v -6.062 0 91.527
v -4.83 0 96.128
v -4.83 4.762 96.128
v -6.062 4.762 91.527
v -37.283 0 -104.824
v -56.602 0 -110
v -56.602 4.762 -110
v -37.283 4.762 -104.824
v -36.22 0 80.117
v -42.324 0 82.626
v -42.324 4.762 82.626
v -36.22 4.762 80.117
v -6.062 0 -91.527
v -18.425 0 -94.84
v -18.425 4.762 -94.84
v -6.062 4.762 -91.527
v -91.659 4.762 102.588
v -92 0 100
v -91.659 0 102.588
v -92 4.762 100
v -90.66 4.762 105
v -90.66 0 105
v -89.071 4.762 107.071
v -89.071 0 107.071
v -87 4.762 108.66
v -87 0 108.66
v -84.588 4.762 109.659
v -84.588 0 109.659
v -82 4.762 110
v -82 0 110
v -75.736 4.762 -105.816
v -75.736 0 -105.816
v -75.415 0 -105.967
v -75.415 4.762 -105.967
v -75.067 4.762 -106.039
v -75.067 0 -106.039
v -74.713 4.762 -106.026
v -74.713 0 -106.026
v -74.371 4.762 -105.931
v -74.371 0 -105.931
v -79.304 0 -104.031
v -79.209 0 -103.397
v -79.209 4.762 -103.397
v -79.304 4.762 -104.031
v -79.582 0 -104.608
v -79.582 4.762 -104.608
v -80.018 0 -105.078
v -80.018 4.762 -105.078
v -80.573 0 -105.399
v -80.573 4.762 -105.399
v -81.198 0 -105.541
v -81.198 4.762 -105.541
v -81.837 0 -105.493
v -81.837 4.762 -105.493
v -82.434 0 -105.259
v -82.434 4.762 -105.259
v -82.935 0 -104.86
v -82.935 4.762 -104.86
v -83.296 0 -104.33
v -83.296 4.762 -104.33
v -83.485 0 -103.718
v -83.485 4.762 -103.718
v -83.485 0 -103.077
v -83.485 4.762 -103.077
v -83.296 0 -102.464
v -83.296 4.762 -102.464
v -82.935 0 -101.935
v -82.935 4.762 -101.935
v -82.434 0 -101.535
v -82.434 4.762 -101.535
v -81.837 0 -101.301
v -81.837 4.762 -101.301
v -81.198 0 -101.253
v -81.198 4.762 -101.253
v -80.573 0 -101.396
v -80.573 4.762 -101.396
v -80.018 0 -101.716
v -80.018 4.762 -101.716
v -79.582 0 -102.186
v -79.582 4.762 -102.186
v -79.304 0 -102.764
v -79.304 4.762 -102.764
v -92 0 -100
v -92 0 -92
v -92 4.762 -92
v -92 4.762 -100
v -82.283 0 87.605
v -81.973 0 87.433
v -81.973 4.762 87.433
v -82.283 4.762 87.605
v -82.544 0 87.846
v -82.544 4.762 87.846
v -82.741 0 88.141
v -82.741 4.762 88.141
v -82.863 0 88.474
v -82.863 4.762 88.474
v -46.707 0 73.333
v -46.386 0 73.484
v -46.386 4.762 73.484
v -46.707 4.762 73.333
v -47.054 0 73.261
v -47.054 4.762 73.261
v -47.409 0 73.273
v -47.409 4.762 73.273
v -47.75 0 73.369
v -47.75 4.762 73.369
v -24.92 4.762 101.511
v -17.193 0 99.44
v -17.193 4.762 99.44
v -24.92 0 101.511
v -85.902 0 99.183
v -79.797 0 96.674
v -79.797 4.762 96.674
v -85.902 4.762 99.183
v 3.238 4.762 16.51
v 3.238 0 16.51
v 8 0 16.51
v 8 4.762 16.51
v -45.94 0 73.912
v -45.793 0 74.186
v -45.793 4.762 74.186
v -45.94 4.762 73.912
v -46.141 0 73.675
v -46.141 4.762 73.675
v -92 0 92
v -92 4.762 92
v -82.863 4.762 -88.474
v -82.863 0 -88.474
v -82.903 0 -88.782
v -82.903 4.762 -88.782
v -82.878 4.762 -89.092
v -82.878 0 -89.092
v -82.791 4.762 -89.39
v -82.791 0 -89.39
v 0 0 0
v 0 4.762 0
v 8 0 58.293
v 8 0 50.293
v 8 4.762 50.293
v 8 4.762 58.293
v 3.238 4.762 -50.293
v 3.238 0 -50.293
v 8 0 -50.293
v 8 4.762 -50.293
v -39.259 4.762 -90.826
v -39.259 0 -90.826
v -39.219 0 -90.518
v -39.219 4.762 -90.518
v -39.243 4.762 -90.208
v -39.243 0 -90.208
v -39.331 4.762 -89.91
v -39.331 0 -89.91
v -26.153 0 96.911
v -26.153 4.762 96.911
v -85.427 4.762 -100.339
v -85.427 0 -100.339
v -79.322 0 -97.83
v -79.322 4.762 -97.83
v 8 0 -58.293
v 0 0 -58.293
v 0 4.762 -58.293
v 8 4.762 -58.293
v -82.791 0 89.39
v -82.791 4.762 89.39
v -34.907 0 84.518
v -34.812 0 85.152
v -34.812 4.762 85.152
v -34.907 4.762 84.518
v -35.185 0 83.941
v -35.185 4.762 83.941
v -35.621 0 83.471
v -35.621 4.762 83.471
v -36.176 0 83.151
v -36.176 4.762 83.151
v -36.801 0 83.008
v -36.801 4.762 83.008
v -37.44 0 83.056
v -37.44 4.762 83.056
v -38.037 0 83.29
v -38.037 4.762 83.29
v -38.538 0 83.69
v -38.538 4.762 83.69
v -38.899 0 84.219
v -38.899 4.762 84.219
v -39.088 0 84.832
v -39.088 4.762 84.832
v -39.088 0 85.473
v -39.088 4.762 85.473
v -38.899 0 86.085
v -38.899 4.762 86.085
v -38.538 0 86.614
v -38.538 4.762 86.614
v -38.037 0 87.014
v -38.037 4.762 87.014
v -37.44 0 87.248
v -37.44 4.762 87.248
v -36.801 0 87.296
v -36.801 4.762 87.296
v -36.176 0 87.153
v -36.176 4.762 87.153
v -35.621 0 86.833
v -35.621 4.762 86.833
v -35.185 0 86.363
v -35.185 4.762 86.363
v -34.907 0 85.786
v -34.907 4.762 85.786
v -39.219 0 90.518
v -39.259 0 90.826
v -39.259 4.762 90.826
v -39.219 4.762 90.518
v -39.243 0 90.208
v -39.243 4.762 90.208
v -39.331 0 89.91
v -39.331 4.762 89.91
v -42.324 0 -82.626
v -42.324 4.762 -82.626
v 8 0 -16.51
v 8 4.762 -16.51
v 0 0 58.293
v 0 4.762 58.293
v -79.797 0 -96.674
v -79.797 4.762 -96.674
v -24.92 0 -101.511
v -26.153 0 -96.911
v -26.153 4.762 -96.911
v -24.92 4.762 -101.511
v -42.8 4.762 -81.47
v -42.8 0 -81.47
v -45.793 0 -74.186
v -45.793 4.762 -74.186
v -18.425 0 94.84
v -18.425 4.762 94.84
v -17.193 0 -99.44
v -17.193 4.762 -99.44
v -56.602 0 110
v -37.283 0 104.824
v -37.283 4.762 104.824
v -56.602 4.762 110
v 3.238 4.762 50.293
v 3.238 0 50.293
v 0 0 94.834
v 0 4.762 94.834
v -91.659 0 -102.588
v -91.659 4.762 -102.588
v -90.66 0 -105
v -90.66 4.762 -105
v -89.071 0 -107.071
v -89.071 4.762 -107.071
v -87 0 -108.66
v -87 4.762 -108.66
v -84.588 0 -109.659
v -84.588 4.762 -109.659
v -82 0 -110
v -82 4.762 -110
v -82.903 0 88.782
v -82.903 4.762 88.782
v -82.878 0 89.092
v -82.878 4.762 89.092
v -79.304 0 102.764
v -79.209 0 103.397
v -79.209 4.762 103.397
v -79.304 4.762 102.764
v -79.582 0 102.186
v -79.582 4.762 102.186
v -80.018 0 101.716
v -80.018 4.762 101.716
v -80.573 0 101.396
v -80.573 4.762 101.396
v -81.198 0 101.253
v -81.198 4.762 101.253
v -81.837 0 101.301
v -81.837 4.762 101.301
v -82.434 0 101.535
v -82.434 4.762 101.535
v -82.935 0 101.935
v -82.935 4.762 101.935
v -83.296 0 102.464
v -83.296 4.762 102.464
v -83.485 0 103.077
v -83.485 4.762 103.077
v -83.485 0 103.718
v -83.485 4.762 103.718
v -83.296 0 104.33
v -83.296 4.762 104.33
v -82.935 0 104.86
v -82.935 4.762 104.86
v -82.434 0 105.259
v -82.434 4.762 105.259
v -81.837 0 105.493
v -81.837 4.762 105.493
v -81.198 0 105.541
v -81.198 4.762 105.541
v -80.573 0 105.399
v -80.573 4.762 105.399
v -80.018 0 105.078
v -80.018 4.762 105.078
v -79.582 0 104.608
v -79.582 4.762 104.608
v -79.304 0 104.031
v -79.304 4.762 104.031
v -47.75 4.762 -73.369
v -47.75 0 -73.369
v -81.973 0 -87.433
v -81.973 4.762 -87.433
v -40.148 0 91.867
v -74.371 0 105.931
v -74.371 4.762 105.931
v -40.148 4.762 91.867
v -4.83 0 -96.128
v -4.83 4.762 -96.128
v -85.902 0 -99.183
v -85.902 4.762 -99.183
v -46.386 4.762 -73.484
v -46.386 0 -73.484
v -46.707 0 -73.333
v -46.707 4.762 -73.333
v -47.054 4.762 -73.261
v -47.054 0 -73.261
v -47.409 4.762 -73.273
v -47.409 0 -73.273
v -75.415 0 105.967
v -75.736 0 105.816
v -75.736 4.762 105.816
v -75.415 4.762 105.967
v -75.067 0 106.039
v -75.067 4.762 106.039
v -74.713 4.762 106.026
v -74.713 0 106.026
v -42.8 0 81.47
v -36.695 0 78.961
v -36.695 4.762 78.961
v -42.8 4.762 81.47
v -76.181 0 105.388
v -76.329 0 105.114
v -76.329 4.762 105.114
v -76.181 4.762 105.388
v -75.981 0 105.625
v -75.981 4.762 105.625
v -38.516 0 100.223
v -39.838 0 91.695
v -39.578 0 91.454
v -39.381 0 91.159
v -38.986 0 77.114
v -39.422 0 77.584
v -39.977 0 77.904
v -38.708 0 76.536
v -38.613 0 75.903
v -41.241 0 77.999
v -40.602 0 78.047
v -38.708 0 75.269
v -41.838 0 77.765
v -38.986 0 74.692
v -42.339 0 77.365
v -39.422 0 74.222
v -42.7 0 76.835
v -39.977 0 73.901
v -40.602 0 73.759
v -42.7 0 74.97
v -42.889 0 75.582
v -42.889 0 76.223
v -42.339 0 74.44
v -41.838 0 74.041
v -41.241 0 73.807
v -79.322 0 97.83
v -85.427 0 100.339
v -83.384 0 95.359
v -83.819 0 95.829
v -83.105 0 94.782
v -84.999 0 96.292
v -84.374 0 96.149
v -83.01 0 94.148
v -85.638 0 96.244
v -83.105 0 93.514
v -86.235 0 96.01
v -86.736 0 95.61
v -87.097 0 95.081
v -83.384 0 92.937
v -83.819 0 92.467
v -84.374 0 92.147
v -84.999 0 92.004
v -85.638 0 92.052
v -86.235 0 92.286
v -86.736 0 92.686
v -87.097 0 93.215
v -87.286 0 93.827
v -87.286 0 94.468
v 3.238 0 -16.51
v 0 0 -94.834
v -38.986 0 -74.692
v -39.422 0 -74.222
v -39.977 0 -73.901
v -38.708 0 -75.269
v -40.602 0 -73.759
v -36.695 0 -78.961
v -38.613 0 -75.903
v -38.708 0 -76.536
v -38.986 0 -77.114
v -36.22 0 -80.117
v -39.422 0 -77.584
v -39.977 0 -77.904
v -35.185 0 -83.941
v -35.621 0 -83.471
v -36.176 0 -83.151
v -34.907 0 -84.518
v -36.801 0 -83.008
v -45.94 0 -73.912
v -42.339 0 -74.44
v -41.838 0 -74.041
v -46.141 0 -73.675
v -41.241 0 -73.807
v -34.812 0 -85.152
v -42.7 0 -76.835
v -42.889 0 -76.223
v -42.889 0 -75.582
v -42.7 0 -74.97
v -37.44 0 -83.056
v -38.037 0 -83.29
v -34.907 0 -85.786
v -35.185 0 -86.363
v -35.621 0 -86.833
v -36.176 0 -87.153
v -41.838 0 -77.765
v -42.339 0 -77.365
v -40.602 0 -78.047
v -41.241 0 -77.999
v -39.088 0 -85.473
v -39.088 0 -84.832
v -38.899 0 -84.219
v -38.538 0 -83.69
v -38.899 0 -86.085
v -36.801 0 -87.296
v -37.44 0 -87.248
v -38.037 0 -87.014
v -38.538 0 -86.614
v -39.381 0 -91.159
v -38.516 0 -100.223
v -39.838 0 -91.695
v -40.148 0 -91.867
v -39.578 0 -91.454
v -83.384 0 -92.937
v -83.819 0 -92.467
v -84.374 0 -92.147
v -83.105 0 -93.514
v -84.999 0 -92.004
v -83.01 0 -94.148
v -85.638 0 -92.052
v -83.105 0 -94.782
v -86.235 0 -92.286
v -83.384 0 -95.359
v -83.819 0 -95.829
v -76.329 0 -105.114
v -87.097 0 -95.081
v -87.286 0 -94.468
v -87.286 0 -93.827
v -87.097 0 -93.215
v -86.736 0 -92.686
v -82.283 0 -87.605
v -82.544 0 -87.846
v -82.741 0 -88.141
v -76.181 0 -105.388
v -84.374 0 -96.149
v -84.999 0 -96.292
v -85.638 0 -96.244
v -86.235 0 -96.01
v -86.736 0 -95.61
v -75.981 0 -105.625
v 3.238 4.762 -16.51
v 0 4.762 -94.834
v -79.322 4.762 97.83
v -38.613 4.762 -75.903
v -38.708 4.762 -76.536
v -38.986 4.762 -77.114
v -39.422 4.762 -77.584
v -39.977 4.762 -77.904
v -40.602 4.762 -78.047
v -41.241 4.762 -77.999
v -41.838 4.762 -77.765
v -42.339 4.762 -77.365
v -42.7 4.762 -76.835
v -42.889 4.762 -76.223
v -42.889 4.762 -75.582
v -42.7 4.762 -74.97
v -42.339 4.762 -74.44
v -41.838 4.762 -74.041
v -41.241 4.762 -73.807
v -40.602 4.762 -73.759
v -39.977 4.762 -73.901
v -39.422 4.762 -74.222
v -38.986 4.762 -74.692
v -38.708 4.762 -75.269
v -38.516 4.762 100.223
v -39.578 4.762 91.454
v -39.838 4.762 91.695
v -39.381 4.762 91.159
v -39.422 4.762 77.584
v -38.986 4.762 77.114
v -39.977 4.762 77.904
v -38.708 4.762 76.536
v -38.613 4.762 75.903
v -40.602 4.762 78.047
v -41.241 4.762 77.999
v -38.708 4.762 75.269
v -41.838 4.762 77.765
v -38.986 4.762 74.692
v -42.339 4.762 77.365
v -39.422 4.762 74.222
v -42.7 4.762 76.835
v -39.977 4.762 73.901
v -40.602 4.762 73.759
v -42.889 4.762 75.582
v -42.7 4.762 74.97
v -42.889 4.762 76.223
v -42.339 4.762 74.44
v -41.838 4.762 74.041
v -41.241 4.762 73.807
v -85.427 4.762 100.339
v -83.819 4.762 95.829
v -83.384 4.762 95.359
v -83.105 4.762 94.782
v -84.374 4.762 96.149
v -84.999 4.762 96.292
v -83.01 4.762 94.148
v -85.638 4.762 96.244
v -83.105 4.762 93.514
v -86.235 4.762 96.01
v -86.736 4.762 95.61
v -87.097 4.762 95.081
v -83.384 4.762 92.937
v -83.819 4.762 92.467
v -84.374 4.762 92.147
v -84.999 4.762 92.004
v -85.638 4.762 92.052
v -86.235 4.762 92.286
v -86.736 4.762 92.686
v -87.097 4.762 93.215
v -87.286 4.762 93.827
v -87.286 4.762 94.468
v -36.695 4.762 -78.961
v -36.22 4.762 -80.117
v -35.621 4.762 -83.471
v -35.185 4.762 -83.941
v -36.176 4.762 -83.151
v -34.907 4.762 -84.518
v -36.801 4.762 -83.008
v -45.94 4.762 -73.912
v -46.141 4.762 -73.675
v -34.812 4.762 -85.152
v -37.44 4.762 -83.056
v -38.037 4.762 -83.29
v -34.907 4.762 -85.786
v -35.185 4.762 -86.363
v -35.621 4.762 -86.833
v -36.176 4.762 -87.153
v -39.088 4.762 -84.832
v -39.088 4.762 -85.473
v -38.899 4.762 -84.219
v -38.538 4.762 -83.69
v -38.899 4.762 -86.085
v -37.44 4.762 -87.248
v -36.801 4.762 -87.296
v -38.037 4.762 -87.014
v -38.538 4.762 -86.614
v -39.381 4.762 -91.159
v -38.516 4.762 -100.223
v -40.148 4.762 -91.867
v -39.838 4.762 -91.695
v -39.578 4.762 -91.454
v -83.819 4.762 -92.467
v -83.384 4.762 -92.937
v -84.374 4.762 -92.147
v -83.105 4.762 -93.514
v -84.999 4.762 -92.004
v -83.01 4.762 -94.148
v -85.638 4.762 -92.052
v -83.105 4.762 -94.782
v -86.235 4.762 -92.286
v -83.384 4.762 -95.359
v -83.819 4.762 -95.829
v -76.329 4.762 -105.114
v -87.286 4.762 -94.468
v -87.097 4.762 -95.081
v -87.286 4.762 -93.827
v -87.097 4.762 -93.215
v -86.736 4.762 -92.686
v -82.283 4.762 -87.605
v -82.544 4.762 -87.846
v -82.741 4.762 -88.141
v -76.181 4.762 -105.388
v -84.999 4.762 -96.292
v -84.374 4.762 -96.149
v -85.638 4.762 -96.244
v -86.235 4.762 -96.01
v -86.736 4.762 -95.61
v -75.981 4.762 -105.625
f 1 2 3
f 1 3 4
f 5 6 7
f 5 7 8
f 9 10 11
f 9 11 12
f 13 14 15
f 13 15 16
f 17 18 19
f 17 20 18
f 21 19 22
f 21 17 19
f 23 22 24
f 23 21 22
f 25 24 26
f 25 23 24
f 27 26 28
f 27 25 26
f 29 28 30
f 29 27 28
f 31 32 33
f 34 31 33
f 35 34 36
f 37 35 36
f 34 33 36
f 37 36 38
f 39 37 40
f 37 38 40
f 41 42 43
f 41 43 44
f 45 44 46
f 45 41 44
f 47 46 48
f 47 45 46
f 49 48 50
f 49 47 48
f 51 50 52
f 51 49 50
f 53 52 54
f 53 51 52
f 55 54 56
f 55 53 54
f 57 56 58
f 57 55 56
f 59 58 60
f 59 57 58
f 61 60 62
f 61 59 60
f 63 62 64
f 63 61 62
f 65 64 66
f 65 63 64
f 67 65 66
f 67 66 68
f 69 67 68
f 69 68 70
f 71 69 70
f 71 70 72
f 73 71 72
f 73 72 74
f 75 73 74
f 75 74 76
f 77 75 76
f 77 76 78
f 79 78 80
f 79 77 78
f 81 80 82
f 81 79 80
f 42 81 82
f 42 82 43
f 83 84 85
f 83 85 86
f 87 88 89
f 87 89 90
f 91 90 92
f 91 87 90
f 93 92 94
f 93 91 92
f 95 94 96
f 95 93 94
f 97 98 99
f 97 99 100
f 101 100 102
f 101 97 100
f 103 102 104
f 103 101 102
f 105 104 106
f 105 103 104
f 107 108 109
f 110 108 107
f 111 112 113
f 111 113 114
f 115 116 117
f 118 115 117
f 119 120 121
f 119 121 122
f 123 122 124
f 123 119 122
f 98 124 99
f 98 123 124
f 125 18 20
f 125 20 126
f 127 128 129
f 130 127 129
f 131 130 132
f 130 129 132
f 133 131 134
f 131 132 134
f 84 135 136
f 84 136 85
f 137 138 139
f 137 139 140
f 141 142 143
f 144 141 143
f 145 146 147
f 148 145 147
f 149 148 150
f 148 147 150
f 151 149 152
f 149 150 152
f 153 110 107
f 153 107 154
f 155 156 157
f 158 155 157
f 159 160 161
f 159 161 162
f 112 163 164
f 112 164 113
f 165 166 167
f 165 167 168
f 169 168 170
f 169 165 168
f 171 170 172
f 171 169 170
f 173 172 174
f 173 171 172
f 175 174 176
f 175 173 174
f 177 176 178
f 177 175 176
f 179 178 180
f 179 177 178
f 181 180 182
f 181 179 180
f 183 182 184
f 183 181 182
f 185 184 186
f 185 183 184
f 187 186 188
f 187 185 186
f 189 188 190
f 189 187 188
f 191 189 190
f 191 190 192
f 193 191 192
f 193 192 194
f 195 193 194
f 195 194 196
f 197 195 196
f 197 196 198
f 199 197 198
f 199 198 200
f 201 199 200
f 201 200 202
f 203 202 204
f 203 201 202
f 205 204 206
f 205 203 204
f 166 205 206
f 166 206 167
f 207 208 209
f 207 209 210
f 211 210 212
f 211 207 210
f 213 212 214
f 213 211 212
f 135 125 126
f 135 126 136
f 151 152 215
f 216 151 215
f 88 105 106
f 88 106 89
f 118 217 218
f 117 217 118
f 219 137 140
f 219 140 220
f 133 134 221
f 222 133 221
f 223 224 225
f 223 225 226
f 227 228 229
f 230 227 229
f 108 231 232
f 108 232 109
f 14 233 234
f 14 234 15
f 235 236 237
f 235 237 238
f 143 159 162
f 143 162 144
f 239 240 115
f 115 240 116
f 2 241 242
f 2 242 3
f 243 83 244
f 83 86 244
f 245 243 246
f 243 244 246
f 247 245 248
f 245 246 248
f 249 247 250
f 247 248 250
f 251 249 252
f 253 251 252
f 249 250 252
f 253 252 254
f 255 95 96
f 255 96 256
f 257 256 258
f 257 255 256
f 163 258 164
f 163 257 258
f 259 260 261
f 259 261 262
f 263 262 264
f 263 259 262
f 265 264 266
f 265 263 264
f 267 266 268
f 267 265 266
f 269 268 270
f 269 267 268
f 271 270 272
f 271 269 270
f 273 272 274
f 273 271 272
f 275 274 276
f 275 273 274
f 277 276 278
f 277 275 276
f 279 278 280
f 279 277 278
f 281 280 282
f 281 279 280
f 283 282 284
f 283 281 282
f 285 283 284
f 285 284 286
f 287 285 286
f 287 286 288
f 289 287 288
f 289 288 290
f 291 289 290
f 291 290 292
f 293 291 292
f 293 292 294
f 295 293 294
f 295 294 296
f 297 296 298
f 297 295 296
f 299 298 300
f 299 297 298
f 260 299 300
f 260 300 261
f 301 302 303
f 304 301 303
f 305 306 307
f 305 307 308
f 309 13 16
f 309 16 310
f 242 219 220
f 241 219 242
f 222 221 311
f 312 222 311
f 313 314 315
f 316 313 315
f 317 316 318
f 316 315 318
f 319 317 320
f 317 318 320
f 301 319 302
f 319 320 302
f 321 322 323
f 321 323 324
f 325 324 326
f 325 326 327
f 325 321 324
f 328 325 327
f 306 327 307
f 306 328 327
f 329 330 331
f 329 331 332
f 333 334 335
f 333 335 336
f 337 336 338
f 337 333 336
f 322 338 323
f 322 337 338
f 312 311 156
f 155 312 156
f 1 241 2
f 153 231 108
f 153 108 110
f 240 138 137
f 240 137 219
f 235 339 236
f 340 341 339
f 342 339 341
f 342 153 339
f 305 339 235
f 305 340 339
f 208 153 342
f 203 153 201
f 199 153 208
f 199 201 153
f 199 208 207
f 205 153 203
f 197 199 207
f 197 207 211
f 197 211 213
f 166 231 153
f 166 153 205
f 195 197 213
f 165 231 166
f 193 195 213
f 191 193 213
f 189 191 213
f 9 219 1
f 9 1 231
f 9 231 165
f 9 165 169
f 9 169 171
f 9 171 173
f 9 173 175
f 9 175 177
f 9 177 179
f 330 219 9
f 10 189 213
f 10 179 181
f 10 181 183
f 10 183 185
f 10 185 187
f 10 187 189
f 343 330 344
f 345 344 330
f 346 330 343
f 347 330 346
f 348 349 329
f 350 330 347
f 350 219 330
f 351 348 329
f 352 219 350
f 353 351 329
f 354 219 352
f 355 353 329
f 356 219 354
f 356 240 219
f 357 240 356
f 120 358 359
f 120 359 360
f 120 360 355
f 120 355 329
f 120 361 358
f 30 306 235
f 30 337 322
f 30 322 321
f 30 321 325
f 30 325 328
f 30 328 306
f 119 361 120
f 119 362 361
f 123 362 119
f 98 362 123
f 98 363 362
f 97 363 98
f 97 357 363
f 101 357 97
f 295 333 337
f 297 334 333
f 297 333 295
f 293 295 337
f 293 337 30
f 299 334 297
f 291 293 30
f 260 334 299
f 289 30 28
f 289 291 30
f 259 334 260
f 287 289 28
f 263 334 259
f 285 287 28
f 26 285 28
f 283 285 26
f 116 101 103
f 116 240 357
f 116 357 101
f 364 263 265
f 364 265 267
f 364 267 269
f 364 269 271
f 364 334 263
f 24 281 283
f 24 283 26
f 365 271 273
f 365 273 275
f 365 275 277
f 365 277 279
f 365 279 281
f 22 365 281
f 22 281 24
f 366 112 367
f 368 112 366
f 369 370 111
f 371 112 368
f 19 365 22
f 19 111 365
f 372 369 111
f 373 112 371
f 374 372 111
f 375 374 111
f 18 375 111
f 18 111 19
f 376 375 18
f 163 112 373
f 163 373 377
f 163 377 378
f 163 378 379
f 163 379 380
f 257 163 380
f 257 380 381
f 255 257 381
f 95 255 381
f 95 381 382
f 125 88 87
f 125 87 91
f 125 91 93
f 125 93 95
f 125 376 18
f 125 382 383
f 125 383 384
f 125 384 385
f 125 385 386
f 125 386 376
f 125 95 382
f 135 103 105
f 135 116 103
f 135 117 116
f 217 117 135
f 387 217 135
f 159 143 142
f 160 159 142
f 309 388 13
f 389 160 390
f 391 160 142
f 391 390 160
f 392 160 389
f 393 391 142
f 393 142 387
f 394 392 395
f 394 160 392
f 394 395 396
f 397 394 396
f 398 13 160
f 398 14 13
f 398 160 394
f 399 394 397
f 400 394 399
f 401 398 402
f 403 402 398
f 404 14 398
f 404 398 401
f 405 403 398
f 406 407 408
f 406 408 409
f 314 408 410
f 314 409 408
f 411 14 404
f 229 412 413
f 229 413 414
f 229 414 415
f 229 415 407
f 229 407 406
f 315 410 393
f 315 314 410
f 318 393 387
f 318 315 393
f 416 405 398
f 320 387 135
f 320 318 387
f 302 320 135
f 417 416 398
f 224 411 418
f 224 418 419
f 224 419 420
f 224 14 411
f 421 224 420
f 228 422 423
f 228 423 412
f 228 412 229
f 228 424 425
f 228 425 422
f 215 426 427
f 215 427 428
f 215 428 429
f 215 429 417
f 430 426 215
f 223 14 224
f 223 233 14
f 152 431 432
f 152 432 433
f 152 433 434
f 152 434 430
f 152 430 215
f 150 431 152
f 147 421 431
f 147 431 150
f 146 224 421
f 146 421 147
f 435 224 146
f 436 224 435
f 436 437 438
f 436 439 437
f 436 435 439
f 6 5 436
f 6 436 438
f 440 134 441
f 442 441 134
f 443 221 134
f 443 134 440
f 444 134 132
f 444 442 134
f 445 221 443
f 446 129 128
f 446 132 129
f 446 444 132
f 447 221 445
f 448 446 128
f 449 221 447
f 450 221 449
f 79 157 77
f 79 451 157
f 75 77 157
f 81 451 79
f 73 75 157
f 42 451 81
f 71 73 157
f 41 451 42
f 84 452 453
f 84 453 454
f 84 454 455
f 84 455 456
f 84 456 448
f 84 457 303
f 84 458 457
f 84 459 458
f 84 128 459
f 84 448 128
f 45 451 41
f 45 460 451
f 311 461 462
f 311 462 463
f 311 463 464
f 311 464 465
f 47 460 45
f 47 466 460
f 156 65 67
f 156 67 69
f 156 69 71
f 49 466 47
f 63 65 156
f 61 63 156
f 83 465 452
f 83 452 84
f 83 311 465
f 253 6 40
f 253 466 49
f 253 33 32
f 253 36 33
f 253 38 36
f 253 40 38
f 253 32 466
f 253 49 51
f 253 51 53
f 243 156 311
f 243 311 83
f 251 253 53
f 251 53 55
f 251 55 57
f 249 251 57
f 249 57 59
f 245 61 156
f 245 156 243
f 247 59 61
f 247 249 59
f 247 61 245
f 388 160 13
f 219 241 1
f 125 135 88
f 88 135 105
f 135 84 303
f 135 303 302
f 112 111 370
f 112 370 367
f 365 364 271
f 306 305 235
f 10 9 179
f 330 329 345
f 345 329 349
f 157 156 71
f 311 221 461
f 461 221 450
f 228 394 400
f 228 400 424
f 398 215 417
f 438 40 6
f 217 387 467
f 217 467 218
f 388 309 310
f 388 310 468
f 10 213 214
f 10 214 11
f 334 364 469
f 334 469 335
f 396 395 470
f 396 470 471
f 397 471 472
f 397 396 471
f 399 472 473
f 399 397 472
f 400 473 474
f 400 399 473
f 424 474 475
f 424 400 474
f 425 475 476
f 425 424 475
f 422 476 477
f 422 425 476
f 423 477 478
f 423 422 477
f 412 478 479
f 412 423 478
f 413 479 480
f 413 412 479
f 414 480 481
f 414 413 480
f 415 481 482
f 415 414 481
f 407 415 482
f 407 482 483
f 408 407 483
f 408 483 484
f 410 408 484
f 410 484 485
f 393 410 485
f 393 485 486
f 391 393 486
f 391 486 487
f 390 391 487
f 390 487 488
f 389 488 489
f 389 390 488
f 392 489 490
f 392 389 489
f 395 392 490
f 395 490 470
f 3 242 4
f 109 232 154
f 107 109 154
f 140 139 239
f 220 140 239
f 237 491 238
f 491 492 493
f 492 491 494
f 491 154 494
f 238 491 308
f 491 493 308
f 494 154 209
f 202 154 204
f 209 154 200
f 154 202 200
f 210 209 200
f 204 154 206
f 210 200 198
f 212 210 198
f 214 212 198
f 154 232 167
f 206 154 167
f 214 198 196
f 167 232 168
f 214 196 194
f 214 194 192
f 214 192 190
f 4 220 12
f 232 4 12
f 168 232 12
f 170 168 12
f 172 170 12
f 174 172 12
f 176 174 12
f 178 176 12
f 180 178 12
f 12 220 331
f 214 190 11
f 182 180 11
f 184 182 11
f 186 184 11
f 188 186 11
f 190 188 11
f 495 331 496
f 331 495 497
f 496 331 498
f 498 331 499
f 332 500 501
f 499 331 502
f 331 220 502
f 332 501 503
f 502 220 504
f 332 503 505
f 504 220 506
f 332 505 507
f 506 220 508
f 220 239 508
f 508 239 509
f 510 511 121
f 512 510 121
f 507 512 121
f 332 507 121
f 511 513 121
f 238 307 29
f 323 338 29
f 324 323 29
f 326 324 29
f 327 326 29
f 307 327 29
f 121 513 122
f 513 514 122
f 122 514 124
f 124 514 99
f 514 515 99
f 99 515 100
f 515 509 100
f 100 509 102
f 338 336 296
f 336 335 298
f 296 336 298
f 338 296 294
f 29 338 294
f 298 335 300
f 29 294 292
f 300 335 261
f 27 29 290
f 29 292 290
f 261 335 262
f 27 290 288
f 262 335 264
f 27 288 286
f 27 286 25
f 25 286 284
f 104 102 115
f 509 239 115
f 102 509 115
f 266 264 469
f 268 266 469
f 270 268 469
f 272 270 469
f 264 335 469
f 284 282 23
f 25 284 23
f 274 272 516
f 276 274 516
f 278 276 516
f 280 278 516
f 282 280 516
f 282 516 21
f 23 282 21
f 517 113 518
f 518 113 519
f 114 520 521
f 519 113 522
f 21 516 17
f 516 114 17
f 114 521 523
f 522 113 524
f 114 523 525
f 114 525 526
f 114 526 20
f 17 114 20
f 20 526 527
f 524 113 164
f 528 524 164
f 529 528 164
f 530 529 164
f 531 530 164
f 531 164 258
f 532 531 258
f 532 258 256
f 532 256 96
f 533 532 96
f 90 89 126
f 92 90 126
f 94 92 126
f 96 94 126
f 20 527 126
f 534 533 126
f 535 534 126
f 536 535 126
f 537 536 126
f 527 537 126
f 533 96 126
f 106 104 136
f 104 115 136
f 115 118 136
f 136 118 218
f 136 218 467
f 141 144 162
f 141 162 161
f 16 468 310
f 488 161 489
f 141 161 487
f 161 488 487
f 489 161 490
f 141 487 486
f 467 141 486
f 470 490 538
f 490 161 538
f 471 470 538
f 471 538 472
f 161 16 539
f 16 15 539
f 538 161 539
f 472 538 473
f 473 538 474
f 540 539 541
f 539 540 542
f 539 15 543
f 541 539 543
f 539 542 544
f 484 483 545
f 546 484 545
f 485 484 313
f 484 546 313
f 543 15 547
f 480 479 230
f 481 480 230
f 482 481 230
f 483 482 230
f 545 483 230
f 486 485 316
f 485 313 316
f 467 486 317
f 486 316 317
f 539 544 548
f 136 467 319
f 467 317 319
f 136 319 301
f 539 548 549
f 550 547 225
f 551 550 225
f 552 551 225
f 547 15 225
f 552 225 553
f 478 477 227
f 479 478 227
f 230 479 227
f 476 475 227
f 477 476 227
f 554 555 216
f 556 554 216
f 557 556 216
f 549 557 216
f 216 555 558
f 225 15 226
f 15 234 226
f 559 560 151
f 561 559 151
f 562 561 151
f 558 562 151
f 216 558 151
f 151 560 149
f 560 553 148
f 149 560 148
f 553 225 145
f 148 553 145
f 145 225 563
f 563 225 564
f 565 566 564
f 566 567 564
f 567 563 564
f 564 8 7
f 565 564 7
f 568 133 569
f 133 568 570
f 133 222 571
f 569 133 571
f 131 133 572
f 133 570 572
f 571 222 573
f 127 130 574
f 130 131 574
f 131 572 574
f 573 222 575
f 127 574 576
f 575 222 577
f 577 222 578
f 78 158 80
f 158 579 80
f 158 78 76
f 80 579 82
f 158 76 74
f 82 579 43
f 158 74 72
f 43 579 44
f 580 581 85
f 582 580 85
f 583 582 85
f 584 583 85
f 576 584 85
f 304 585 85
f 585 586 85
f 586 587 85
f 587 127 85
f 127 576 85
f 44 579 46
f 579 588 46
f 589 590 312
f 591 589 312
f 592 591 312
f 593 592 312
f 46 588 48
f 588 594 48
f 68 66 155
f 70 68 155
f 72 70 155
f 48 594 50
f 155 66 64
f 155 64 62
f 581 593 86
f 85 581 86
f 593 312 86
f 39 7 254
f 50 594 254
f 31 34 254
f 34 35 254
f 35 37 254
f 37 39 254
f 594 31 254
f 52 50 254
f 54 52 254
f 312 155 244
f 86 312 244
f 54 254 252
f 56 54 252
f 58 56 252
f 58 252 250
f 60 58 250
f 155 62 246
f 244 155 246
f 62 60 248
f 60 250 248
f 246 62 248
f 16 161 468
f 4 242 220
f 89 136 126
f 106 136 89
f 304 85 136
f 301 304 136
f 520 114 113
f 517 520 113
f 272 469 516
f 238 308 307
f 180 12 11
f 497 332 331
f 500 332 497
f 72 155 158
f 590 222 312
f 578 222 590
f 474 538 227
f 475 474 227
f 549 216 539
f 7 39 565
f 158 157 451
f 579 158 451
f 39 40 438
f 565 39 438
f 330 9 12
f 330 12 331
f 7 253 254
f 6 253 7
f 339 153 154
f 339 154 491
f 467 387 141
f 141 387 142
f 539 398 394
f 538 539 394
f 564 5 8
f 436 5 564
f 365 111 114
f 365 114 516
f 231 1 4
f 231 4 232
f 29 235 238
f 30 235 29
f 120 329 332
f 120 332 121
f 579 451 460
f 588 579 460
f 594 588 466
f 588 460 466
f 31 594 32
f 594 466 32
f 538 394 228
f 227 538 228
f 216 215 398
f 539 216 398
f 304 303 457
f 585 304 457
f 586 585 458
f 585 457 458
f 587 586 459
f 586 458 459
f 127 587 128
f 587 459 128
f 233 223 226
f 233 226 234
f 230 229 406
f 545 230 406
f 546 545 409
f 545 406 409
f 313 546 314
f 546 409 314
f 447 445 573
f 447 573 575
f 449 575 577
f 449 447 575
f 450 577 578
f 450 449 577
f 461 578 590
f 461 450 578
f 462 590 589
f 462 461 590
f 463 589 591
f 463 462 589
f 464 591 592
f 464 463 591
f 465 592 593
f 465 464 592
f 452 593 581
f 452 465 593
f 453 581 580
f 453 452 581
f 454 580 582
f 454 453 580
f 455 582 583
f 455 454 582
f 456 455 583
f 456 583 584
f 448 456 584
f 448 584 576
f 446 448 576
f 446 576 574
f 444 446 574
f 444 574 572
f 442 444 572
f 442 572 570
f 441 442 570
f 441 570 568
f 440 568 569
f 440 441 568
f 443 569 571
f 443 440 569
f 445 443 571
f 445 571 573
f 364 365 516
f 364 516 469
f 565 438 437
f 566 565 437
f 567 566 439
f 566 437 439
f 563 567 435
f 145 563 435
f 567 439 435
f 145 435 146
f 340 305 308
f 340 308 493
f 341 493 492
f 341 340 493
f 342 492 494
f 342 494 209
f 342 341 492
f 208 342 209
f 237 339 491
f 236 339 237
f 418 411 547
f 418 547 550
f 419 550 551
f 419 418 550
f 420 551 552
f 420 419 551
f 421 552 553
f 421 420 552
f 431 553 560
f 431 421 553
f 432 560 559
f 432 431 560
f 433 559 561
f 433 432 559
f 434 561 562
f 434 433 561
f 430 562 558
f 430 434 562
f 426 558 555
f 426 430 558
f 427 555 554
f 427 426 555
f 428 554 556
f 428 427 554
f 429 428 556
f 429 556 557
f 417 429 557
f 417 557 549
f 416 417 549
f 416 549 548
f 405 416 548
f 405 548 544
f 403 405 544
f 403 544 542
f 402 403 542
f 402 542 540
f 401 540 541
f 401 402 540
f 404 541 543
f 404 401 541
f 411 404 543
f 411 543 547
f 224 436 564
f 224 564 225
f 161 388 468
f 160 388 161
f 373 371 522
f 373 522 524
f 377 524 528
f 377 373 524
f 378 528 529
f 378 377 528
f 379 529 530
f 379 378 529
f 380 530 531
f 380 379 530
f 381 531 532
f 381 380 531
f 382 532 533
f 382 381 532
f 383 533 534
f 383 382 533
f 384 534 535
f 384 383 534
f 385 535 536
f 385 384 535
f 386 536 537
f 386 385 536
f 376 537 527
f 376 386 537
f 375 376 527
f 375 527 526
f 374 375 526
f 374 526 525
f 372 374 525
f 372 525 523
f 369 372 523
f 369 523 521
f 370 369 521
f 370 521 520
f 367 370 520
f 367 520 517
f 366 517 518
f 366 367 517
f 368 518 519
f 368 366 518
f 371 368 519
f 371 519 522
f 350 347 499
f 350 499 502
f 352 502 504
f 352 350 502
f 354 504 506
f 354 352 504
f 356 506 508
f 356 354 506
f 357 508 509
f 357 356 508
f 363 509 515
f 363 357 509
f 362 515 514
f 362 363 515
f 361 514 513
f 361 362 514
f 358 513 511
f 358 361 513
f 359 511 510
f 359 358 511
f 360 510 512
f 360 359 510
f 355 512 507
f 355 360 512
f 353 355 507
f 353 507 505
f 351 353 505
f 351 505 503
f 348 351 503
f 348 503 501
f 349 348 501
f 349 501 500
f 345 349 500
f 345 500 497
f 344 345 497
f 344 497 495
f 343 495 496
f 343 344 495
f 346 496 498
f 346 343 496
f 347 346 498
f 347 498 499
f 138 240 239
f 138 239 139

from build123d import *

# Parameters (mm, degrees)
SKETCH1_R           = 2.15
BOSS_EXTRUDE1_DEPTH = 4.7625
FILLET1_R           = 10
SKETCH2_W           = 4.7625
SKETCH2_H           = 33.783
CUT_EXTRUDE1_DEPTH  = 10


with BuildPart() as part:
    # Sketch1 → Boss-Extrude1 (new body)
    with BuildSketch(Plane(origin=(0, 0, 0), x_dir=(1, 0, 0), z_dir=(0, 1, 0))):
        Polygon((0, 0), (-92, 92), (-92, 110), (-56.601944845, 110), (0, 94.833554589), (0, 58.293), (8, 58.293), (8, -58.293), (0, -58.293), (0, -94.833554589), (-56.601944845, -110), (-92, -110), (-92, -92), align=None)
        with Locations((-85.159917522, 94.147890435)):
            Circle(SKETCH1_R, mode=Mode.SUBTRACT)
        with Locations((-81.358825255, 103.397306502)):
            Circle(SKETCH1_R, mode=Mode.SUBTRACT)
        with Locations((-36.961628134, 85.152063619)):
            Circle(SKETCH1_R, mode=Mode.SUBTRACT)
        with Locations((-40.762720402, 75.902647552)):
            Circle(SKETCH1_R, mode=Mode.SUBTRACT)
        with Locations((-40.762720402, -75.902647552)):
            Circle(SKETCH1_R, mode=Mode.SUBTRACT)
        with Locations((-36.961628134, -85.152063619)):
            Circle(SKETCH1_R, mode=Mode.SUBTRACT)
        with Locations((-81.358825255, -103.397306502)):
            Circle(SKETCH1_R, mode=Mode.SUBTRACT)
        with Locations((-85.159917522, -94.147890435)):
            Circle(SKETCH1_R, mode=Mode.SUBTRACT)
        with BuildLine():
            Line((-79.322036695, 97.830250065), (-76.328676535, 105.114165218))
            ThreePointArc((-76.328676535, 105.114165218), (-76.087243425, 105.511850251), (-75.735570504, 105.816431091))
            ThreePointArc((-75.735570504, 105.816431091), (-75.067221358, 106.038703614), (-74.371100284, 105.931413788))
            Line((-74.371100284, 105.931413788), (-40.148260837, 91.867372399))
            ThreePointArc((-40.148260837, 91.867372399), (-39.577853455, 91.454176231), (-39.258927152, 90.826178087))
            ThreePointArc((-39.258927152, 90.826178087), (-39.223044121, 90.362329254), (-39.331012268, 89.909796149))
            Line((-39.331012268, 89.909796149), (-42.324372428, 82.625880996))
            Line((-42.324372428, 82.625880996), (-36.219757824, 80.1171601))
            Line((-36.219757824, 80.1171601), (-36.694894357, 78.960983092))
            Line((-36.694894357, 78.960983092), (-42.799508961, 81.469703988))
            Line((-42.799508961, 81.469703988), (-45.792869122, 74.185788836))
            ThreePointArc((-45.792869122, 74.185788836), (-46.034302231, 73.788103802), (-46.385975153, 73.483522962))
            ThreePointArc((-46.385975153, 73.483522962), (-47.054324299, 73.261250439), (-47.750445372, 73.368540266))
            Line((-47.750445372, 73.368540266), (-81.973284819, 87.432581654))
            ThreePointArc((-81.973284819, 87.432581654), (-82.543692202, 87.845777823), (-82.862618505, 88.473775966))
            ThreePointArc((-82.862618505, 88.473775966), (-82.898501536, 88.937624799), (-82.790533389, 89.390157905))
            Line((-82.790533389, 89.390157905), (-79.797173228, 96.674073057))
            Line((-79.797173228, 96.674073057), (-85.901787832, 99.182793954))
            Line((-85.901787832, 99.182793954), (-85.426651299, 100.338970962))
            Line((-85.426651299, 100.338970962), (-79.322036695, 97.830250065))
        make_face(mode=Mode.SUBTRACT)
        with BuildLine():
            Line((-47.750445372, -73.368540266), (-81.973284819, -87.432581654))
            ThreePointArc((-81.973284819, -87.432581654), (-82.543692202, -87.845777823), (-82.862618505, -88.473775966))
            ThreePointArc((-82.862618505, -88.473775966), (-82.898501536, -88.937624799), (-82.790533389, -89.390157905))
            Line((-82.790533389, -89.390157905), (-79.797173228, -96.674073057))
            Line((-79.797173228, -96.674073057), (-85.901787832, -99.182793954))
            Line((-85.901787832, -99.182793954), (-85.426651299, -100.338970962))
            Line((-85.426651299, -100.338970962), (-79.322036695, -97.830250065))
            Line((-79.322036695, -97.830250065), (-76.328676535, -105.114165218))
            ThreePointArc((-76.328676535, -105.114165218), (-76.087243425, -105.511850251), (-75.735570504, -105.816431091))
            ThreePointArc((-75.735570504, -105.816431091), (-75.067221358, -106.038703614), (-74.371100284, -105.931413788))
            Line((-74.371100284, -105.931413788), (-40.148260837, -91.867372399))
            ThreePointArc((-40.148260837, -91.867372399), (-39.577853455, -91.454176231), (-39.258927152, -90.826178087))
            ThreePointArc((-39.258927152, -90.826178087), (-39.223044121, -90.362329254), (-39.331012268, -89.909796149))
            Line((-39.331012268, -89.909796149), (-42.324372428, -82.625880996))
            Line((-42.324372428, -82.625880996), (-36.219757824, -80.1171601))
            Line((-36.219757824, -80.1171601), (-36.694894357, -78.960983092))
            Line((-36.694894357, -78.960983092), (-42.799508961, -81.469703988))
            Line((-42.799508961, -81.469703988), (-45.792869122, -74.185788836))
            ThreePointArc((-45.792869122, -74.185788836), (-46.034302231, -73.788103802), (-46.385975153, -73.483522962))
            ThreePointArc((-46.385975153, -73.483522962), (-47.054324299, -73.261250439), (-47.750445372, -73.368540266))
        make_face(mode=Mode.SUBTRACT)
    extrude(amount=BOSS_EXTRUDE1_DEPTH)

    # Fillet1
    fillet1_edges = [part.edges().sort_by_distance(p)[0] for p in [
        (-92, 2.38125, -110),
        (-92, 2.38125, 110),
    ]]
    fillet(fillet1_edges, radius=FILLET1_R)

    # Sketch2 → Cut-Extrude1 (cut)
    with BuildSketch(Plane(origin=(0, 0, 0), x_dir=(1, 0, 0), z_dir=(0, 1, 0))):
        Polygon((-4.829629131, 96.127649814), (-17.19282542, 99.440358276), (-18.425451123, 94.840136528), (-6.062254834, 91.527428067), align=None)
        Polygon((-24.920232031, 101.510910637), (-37.283428319, 104.823619098), (-38.516054022, 100.22339735), (-26.152857733, 96.910688889), align=None)
        Polygon((-26.152857733, -96.910688889), (-38.516054022, -100.22339735), (-37.283428319, -104.823619098), (-24.920232031, -101.510910637), align=None)
        Polygon((-6.062254834, -91.527428067), (-18.425451123, -94.840136528), (-17.19282542, -99.440358276), (-4.829629131, -96.127649814), align=None)
        with Locations((5.61875, 33.4015)):
            Rectangle(SKETCH2_W, SKETCH2_H)
        with Locations((5.61875, -33.4015)):
            Rectangle(SKETCH2_W, SKETCH2_H)
    extrude(amount=CUT_EXTRUDE1_DEPTH, mode=Mode.SUBTRACT)


solid = part.part
